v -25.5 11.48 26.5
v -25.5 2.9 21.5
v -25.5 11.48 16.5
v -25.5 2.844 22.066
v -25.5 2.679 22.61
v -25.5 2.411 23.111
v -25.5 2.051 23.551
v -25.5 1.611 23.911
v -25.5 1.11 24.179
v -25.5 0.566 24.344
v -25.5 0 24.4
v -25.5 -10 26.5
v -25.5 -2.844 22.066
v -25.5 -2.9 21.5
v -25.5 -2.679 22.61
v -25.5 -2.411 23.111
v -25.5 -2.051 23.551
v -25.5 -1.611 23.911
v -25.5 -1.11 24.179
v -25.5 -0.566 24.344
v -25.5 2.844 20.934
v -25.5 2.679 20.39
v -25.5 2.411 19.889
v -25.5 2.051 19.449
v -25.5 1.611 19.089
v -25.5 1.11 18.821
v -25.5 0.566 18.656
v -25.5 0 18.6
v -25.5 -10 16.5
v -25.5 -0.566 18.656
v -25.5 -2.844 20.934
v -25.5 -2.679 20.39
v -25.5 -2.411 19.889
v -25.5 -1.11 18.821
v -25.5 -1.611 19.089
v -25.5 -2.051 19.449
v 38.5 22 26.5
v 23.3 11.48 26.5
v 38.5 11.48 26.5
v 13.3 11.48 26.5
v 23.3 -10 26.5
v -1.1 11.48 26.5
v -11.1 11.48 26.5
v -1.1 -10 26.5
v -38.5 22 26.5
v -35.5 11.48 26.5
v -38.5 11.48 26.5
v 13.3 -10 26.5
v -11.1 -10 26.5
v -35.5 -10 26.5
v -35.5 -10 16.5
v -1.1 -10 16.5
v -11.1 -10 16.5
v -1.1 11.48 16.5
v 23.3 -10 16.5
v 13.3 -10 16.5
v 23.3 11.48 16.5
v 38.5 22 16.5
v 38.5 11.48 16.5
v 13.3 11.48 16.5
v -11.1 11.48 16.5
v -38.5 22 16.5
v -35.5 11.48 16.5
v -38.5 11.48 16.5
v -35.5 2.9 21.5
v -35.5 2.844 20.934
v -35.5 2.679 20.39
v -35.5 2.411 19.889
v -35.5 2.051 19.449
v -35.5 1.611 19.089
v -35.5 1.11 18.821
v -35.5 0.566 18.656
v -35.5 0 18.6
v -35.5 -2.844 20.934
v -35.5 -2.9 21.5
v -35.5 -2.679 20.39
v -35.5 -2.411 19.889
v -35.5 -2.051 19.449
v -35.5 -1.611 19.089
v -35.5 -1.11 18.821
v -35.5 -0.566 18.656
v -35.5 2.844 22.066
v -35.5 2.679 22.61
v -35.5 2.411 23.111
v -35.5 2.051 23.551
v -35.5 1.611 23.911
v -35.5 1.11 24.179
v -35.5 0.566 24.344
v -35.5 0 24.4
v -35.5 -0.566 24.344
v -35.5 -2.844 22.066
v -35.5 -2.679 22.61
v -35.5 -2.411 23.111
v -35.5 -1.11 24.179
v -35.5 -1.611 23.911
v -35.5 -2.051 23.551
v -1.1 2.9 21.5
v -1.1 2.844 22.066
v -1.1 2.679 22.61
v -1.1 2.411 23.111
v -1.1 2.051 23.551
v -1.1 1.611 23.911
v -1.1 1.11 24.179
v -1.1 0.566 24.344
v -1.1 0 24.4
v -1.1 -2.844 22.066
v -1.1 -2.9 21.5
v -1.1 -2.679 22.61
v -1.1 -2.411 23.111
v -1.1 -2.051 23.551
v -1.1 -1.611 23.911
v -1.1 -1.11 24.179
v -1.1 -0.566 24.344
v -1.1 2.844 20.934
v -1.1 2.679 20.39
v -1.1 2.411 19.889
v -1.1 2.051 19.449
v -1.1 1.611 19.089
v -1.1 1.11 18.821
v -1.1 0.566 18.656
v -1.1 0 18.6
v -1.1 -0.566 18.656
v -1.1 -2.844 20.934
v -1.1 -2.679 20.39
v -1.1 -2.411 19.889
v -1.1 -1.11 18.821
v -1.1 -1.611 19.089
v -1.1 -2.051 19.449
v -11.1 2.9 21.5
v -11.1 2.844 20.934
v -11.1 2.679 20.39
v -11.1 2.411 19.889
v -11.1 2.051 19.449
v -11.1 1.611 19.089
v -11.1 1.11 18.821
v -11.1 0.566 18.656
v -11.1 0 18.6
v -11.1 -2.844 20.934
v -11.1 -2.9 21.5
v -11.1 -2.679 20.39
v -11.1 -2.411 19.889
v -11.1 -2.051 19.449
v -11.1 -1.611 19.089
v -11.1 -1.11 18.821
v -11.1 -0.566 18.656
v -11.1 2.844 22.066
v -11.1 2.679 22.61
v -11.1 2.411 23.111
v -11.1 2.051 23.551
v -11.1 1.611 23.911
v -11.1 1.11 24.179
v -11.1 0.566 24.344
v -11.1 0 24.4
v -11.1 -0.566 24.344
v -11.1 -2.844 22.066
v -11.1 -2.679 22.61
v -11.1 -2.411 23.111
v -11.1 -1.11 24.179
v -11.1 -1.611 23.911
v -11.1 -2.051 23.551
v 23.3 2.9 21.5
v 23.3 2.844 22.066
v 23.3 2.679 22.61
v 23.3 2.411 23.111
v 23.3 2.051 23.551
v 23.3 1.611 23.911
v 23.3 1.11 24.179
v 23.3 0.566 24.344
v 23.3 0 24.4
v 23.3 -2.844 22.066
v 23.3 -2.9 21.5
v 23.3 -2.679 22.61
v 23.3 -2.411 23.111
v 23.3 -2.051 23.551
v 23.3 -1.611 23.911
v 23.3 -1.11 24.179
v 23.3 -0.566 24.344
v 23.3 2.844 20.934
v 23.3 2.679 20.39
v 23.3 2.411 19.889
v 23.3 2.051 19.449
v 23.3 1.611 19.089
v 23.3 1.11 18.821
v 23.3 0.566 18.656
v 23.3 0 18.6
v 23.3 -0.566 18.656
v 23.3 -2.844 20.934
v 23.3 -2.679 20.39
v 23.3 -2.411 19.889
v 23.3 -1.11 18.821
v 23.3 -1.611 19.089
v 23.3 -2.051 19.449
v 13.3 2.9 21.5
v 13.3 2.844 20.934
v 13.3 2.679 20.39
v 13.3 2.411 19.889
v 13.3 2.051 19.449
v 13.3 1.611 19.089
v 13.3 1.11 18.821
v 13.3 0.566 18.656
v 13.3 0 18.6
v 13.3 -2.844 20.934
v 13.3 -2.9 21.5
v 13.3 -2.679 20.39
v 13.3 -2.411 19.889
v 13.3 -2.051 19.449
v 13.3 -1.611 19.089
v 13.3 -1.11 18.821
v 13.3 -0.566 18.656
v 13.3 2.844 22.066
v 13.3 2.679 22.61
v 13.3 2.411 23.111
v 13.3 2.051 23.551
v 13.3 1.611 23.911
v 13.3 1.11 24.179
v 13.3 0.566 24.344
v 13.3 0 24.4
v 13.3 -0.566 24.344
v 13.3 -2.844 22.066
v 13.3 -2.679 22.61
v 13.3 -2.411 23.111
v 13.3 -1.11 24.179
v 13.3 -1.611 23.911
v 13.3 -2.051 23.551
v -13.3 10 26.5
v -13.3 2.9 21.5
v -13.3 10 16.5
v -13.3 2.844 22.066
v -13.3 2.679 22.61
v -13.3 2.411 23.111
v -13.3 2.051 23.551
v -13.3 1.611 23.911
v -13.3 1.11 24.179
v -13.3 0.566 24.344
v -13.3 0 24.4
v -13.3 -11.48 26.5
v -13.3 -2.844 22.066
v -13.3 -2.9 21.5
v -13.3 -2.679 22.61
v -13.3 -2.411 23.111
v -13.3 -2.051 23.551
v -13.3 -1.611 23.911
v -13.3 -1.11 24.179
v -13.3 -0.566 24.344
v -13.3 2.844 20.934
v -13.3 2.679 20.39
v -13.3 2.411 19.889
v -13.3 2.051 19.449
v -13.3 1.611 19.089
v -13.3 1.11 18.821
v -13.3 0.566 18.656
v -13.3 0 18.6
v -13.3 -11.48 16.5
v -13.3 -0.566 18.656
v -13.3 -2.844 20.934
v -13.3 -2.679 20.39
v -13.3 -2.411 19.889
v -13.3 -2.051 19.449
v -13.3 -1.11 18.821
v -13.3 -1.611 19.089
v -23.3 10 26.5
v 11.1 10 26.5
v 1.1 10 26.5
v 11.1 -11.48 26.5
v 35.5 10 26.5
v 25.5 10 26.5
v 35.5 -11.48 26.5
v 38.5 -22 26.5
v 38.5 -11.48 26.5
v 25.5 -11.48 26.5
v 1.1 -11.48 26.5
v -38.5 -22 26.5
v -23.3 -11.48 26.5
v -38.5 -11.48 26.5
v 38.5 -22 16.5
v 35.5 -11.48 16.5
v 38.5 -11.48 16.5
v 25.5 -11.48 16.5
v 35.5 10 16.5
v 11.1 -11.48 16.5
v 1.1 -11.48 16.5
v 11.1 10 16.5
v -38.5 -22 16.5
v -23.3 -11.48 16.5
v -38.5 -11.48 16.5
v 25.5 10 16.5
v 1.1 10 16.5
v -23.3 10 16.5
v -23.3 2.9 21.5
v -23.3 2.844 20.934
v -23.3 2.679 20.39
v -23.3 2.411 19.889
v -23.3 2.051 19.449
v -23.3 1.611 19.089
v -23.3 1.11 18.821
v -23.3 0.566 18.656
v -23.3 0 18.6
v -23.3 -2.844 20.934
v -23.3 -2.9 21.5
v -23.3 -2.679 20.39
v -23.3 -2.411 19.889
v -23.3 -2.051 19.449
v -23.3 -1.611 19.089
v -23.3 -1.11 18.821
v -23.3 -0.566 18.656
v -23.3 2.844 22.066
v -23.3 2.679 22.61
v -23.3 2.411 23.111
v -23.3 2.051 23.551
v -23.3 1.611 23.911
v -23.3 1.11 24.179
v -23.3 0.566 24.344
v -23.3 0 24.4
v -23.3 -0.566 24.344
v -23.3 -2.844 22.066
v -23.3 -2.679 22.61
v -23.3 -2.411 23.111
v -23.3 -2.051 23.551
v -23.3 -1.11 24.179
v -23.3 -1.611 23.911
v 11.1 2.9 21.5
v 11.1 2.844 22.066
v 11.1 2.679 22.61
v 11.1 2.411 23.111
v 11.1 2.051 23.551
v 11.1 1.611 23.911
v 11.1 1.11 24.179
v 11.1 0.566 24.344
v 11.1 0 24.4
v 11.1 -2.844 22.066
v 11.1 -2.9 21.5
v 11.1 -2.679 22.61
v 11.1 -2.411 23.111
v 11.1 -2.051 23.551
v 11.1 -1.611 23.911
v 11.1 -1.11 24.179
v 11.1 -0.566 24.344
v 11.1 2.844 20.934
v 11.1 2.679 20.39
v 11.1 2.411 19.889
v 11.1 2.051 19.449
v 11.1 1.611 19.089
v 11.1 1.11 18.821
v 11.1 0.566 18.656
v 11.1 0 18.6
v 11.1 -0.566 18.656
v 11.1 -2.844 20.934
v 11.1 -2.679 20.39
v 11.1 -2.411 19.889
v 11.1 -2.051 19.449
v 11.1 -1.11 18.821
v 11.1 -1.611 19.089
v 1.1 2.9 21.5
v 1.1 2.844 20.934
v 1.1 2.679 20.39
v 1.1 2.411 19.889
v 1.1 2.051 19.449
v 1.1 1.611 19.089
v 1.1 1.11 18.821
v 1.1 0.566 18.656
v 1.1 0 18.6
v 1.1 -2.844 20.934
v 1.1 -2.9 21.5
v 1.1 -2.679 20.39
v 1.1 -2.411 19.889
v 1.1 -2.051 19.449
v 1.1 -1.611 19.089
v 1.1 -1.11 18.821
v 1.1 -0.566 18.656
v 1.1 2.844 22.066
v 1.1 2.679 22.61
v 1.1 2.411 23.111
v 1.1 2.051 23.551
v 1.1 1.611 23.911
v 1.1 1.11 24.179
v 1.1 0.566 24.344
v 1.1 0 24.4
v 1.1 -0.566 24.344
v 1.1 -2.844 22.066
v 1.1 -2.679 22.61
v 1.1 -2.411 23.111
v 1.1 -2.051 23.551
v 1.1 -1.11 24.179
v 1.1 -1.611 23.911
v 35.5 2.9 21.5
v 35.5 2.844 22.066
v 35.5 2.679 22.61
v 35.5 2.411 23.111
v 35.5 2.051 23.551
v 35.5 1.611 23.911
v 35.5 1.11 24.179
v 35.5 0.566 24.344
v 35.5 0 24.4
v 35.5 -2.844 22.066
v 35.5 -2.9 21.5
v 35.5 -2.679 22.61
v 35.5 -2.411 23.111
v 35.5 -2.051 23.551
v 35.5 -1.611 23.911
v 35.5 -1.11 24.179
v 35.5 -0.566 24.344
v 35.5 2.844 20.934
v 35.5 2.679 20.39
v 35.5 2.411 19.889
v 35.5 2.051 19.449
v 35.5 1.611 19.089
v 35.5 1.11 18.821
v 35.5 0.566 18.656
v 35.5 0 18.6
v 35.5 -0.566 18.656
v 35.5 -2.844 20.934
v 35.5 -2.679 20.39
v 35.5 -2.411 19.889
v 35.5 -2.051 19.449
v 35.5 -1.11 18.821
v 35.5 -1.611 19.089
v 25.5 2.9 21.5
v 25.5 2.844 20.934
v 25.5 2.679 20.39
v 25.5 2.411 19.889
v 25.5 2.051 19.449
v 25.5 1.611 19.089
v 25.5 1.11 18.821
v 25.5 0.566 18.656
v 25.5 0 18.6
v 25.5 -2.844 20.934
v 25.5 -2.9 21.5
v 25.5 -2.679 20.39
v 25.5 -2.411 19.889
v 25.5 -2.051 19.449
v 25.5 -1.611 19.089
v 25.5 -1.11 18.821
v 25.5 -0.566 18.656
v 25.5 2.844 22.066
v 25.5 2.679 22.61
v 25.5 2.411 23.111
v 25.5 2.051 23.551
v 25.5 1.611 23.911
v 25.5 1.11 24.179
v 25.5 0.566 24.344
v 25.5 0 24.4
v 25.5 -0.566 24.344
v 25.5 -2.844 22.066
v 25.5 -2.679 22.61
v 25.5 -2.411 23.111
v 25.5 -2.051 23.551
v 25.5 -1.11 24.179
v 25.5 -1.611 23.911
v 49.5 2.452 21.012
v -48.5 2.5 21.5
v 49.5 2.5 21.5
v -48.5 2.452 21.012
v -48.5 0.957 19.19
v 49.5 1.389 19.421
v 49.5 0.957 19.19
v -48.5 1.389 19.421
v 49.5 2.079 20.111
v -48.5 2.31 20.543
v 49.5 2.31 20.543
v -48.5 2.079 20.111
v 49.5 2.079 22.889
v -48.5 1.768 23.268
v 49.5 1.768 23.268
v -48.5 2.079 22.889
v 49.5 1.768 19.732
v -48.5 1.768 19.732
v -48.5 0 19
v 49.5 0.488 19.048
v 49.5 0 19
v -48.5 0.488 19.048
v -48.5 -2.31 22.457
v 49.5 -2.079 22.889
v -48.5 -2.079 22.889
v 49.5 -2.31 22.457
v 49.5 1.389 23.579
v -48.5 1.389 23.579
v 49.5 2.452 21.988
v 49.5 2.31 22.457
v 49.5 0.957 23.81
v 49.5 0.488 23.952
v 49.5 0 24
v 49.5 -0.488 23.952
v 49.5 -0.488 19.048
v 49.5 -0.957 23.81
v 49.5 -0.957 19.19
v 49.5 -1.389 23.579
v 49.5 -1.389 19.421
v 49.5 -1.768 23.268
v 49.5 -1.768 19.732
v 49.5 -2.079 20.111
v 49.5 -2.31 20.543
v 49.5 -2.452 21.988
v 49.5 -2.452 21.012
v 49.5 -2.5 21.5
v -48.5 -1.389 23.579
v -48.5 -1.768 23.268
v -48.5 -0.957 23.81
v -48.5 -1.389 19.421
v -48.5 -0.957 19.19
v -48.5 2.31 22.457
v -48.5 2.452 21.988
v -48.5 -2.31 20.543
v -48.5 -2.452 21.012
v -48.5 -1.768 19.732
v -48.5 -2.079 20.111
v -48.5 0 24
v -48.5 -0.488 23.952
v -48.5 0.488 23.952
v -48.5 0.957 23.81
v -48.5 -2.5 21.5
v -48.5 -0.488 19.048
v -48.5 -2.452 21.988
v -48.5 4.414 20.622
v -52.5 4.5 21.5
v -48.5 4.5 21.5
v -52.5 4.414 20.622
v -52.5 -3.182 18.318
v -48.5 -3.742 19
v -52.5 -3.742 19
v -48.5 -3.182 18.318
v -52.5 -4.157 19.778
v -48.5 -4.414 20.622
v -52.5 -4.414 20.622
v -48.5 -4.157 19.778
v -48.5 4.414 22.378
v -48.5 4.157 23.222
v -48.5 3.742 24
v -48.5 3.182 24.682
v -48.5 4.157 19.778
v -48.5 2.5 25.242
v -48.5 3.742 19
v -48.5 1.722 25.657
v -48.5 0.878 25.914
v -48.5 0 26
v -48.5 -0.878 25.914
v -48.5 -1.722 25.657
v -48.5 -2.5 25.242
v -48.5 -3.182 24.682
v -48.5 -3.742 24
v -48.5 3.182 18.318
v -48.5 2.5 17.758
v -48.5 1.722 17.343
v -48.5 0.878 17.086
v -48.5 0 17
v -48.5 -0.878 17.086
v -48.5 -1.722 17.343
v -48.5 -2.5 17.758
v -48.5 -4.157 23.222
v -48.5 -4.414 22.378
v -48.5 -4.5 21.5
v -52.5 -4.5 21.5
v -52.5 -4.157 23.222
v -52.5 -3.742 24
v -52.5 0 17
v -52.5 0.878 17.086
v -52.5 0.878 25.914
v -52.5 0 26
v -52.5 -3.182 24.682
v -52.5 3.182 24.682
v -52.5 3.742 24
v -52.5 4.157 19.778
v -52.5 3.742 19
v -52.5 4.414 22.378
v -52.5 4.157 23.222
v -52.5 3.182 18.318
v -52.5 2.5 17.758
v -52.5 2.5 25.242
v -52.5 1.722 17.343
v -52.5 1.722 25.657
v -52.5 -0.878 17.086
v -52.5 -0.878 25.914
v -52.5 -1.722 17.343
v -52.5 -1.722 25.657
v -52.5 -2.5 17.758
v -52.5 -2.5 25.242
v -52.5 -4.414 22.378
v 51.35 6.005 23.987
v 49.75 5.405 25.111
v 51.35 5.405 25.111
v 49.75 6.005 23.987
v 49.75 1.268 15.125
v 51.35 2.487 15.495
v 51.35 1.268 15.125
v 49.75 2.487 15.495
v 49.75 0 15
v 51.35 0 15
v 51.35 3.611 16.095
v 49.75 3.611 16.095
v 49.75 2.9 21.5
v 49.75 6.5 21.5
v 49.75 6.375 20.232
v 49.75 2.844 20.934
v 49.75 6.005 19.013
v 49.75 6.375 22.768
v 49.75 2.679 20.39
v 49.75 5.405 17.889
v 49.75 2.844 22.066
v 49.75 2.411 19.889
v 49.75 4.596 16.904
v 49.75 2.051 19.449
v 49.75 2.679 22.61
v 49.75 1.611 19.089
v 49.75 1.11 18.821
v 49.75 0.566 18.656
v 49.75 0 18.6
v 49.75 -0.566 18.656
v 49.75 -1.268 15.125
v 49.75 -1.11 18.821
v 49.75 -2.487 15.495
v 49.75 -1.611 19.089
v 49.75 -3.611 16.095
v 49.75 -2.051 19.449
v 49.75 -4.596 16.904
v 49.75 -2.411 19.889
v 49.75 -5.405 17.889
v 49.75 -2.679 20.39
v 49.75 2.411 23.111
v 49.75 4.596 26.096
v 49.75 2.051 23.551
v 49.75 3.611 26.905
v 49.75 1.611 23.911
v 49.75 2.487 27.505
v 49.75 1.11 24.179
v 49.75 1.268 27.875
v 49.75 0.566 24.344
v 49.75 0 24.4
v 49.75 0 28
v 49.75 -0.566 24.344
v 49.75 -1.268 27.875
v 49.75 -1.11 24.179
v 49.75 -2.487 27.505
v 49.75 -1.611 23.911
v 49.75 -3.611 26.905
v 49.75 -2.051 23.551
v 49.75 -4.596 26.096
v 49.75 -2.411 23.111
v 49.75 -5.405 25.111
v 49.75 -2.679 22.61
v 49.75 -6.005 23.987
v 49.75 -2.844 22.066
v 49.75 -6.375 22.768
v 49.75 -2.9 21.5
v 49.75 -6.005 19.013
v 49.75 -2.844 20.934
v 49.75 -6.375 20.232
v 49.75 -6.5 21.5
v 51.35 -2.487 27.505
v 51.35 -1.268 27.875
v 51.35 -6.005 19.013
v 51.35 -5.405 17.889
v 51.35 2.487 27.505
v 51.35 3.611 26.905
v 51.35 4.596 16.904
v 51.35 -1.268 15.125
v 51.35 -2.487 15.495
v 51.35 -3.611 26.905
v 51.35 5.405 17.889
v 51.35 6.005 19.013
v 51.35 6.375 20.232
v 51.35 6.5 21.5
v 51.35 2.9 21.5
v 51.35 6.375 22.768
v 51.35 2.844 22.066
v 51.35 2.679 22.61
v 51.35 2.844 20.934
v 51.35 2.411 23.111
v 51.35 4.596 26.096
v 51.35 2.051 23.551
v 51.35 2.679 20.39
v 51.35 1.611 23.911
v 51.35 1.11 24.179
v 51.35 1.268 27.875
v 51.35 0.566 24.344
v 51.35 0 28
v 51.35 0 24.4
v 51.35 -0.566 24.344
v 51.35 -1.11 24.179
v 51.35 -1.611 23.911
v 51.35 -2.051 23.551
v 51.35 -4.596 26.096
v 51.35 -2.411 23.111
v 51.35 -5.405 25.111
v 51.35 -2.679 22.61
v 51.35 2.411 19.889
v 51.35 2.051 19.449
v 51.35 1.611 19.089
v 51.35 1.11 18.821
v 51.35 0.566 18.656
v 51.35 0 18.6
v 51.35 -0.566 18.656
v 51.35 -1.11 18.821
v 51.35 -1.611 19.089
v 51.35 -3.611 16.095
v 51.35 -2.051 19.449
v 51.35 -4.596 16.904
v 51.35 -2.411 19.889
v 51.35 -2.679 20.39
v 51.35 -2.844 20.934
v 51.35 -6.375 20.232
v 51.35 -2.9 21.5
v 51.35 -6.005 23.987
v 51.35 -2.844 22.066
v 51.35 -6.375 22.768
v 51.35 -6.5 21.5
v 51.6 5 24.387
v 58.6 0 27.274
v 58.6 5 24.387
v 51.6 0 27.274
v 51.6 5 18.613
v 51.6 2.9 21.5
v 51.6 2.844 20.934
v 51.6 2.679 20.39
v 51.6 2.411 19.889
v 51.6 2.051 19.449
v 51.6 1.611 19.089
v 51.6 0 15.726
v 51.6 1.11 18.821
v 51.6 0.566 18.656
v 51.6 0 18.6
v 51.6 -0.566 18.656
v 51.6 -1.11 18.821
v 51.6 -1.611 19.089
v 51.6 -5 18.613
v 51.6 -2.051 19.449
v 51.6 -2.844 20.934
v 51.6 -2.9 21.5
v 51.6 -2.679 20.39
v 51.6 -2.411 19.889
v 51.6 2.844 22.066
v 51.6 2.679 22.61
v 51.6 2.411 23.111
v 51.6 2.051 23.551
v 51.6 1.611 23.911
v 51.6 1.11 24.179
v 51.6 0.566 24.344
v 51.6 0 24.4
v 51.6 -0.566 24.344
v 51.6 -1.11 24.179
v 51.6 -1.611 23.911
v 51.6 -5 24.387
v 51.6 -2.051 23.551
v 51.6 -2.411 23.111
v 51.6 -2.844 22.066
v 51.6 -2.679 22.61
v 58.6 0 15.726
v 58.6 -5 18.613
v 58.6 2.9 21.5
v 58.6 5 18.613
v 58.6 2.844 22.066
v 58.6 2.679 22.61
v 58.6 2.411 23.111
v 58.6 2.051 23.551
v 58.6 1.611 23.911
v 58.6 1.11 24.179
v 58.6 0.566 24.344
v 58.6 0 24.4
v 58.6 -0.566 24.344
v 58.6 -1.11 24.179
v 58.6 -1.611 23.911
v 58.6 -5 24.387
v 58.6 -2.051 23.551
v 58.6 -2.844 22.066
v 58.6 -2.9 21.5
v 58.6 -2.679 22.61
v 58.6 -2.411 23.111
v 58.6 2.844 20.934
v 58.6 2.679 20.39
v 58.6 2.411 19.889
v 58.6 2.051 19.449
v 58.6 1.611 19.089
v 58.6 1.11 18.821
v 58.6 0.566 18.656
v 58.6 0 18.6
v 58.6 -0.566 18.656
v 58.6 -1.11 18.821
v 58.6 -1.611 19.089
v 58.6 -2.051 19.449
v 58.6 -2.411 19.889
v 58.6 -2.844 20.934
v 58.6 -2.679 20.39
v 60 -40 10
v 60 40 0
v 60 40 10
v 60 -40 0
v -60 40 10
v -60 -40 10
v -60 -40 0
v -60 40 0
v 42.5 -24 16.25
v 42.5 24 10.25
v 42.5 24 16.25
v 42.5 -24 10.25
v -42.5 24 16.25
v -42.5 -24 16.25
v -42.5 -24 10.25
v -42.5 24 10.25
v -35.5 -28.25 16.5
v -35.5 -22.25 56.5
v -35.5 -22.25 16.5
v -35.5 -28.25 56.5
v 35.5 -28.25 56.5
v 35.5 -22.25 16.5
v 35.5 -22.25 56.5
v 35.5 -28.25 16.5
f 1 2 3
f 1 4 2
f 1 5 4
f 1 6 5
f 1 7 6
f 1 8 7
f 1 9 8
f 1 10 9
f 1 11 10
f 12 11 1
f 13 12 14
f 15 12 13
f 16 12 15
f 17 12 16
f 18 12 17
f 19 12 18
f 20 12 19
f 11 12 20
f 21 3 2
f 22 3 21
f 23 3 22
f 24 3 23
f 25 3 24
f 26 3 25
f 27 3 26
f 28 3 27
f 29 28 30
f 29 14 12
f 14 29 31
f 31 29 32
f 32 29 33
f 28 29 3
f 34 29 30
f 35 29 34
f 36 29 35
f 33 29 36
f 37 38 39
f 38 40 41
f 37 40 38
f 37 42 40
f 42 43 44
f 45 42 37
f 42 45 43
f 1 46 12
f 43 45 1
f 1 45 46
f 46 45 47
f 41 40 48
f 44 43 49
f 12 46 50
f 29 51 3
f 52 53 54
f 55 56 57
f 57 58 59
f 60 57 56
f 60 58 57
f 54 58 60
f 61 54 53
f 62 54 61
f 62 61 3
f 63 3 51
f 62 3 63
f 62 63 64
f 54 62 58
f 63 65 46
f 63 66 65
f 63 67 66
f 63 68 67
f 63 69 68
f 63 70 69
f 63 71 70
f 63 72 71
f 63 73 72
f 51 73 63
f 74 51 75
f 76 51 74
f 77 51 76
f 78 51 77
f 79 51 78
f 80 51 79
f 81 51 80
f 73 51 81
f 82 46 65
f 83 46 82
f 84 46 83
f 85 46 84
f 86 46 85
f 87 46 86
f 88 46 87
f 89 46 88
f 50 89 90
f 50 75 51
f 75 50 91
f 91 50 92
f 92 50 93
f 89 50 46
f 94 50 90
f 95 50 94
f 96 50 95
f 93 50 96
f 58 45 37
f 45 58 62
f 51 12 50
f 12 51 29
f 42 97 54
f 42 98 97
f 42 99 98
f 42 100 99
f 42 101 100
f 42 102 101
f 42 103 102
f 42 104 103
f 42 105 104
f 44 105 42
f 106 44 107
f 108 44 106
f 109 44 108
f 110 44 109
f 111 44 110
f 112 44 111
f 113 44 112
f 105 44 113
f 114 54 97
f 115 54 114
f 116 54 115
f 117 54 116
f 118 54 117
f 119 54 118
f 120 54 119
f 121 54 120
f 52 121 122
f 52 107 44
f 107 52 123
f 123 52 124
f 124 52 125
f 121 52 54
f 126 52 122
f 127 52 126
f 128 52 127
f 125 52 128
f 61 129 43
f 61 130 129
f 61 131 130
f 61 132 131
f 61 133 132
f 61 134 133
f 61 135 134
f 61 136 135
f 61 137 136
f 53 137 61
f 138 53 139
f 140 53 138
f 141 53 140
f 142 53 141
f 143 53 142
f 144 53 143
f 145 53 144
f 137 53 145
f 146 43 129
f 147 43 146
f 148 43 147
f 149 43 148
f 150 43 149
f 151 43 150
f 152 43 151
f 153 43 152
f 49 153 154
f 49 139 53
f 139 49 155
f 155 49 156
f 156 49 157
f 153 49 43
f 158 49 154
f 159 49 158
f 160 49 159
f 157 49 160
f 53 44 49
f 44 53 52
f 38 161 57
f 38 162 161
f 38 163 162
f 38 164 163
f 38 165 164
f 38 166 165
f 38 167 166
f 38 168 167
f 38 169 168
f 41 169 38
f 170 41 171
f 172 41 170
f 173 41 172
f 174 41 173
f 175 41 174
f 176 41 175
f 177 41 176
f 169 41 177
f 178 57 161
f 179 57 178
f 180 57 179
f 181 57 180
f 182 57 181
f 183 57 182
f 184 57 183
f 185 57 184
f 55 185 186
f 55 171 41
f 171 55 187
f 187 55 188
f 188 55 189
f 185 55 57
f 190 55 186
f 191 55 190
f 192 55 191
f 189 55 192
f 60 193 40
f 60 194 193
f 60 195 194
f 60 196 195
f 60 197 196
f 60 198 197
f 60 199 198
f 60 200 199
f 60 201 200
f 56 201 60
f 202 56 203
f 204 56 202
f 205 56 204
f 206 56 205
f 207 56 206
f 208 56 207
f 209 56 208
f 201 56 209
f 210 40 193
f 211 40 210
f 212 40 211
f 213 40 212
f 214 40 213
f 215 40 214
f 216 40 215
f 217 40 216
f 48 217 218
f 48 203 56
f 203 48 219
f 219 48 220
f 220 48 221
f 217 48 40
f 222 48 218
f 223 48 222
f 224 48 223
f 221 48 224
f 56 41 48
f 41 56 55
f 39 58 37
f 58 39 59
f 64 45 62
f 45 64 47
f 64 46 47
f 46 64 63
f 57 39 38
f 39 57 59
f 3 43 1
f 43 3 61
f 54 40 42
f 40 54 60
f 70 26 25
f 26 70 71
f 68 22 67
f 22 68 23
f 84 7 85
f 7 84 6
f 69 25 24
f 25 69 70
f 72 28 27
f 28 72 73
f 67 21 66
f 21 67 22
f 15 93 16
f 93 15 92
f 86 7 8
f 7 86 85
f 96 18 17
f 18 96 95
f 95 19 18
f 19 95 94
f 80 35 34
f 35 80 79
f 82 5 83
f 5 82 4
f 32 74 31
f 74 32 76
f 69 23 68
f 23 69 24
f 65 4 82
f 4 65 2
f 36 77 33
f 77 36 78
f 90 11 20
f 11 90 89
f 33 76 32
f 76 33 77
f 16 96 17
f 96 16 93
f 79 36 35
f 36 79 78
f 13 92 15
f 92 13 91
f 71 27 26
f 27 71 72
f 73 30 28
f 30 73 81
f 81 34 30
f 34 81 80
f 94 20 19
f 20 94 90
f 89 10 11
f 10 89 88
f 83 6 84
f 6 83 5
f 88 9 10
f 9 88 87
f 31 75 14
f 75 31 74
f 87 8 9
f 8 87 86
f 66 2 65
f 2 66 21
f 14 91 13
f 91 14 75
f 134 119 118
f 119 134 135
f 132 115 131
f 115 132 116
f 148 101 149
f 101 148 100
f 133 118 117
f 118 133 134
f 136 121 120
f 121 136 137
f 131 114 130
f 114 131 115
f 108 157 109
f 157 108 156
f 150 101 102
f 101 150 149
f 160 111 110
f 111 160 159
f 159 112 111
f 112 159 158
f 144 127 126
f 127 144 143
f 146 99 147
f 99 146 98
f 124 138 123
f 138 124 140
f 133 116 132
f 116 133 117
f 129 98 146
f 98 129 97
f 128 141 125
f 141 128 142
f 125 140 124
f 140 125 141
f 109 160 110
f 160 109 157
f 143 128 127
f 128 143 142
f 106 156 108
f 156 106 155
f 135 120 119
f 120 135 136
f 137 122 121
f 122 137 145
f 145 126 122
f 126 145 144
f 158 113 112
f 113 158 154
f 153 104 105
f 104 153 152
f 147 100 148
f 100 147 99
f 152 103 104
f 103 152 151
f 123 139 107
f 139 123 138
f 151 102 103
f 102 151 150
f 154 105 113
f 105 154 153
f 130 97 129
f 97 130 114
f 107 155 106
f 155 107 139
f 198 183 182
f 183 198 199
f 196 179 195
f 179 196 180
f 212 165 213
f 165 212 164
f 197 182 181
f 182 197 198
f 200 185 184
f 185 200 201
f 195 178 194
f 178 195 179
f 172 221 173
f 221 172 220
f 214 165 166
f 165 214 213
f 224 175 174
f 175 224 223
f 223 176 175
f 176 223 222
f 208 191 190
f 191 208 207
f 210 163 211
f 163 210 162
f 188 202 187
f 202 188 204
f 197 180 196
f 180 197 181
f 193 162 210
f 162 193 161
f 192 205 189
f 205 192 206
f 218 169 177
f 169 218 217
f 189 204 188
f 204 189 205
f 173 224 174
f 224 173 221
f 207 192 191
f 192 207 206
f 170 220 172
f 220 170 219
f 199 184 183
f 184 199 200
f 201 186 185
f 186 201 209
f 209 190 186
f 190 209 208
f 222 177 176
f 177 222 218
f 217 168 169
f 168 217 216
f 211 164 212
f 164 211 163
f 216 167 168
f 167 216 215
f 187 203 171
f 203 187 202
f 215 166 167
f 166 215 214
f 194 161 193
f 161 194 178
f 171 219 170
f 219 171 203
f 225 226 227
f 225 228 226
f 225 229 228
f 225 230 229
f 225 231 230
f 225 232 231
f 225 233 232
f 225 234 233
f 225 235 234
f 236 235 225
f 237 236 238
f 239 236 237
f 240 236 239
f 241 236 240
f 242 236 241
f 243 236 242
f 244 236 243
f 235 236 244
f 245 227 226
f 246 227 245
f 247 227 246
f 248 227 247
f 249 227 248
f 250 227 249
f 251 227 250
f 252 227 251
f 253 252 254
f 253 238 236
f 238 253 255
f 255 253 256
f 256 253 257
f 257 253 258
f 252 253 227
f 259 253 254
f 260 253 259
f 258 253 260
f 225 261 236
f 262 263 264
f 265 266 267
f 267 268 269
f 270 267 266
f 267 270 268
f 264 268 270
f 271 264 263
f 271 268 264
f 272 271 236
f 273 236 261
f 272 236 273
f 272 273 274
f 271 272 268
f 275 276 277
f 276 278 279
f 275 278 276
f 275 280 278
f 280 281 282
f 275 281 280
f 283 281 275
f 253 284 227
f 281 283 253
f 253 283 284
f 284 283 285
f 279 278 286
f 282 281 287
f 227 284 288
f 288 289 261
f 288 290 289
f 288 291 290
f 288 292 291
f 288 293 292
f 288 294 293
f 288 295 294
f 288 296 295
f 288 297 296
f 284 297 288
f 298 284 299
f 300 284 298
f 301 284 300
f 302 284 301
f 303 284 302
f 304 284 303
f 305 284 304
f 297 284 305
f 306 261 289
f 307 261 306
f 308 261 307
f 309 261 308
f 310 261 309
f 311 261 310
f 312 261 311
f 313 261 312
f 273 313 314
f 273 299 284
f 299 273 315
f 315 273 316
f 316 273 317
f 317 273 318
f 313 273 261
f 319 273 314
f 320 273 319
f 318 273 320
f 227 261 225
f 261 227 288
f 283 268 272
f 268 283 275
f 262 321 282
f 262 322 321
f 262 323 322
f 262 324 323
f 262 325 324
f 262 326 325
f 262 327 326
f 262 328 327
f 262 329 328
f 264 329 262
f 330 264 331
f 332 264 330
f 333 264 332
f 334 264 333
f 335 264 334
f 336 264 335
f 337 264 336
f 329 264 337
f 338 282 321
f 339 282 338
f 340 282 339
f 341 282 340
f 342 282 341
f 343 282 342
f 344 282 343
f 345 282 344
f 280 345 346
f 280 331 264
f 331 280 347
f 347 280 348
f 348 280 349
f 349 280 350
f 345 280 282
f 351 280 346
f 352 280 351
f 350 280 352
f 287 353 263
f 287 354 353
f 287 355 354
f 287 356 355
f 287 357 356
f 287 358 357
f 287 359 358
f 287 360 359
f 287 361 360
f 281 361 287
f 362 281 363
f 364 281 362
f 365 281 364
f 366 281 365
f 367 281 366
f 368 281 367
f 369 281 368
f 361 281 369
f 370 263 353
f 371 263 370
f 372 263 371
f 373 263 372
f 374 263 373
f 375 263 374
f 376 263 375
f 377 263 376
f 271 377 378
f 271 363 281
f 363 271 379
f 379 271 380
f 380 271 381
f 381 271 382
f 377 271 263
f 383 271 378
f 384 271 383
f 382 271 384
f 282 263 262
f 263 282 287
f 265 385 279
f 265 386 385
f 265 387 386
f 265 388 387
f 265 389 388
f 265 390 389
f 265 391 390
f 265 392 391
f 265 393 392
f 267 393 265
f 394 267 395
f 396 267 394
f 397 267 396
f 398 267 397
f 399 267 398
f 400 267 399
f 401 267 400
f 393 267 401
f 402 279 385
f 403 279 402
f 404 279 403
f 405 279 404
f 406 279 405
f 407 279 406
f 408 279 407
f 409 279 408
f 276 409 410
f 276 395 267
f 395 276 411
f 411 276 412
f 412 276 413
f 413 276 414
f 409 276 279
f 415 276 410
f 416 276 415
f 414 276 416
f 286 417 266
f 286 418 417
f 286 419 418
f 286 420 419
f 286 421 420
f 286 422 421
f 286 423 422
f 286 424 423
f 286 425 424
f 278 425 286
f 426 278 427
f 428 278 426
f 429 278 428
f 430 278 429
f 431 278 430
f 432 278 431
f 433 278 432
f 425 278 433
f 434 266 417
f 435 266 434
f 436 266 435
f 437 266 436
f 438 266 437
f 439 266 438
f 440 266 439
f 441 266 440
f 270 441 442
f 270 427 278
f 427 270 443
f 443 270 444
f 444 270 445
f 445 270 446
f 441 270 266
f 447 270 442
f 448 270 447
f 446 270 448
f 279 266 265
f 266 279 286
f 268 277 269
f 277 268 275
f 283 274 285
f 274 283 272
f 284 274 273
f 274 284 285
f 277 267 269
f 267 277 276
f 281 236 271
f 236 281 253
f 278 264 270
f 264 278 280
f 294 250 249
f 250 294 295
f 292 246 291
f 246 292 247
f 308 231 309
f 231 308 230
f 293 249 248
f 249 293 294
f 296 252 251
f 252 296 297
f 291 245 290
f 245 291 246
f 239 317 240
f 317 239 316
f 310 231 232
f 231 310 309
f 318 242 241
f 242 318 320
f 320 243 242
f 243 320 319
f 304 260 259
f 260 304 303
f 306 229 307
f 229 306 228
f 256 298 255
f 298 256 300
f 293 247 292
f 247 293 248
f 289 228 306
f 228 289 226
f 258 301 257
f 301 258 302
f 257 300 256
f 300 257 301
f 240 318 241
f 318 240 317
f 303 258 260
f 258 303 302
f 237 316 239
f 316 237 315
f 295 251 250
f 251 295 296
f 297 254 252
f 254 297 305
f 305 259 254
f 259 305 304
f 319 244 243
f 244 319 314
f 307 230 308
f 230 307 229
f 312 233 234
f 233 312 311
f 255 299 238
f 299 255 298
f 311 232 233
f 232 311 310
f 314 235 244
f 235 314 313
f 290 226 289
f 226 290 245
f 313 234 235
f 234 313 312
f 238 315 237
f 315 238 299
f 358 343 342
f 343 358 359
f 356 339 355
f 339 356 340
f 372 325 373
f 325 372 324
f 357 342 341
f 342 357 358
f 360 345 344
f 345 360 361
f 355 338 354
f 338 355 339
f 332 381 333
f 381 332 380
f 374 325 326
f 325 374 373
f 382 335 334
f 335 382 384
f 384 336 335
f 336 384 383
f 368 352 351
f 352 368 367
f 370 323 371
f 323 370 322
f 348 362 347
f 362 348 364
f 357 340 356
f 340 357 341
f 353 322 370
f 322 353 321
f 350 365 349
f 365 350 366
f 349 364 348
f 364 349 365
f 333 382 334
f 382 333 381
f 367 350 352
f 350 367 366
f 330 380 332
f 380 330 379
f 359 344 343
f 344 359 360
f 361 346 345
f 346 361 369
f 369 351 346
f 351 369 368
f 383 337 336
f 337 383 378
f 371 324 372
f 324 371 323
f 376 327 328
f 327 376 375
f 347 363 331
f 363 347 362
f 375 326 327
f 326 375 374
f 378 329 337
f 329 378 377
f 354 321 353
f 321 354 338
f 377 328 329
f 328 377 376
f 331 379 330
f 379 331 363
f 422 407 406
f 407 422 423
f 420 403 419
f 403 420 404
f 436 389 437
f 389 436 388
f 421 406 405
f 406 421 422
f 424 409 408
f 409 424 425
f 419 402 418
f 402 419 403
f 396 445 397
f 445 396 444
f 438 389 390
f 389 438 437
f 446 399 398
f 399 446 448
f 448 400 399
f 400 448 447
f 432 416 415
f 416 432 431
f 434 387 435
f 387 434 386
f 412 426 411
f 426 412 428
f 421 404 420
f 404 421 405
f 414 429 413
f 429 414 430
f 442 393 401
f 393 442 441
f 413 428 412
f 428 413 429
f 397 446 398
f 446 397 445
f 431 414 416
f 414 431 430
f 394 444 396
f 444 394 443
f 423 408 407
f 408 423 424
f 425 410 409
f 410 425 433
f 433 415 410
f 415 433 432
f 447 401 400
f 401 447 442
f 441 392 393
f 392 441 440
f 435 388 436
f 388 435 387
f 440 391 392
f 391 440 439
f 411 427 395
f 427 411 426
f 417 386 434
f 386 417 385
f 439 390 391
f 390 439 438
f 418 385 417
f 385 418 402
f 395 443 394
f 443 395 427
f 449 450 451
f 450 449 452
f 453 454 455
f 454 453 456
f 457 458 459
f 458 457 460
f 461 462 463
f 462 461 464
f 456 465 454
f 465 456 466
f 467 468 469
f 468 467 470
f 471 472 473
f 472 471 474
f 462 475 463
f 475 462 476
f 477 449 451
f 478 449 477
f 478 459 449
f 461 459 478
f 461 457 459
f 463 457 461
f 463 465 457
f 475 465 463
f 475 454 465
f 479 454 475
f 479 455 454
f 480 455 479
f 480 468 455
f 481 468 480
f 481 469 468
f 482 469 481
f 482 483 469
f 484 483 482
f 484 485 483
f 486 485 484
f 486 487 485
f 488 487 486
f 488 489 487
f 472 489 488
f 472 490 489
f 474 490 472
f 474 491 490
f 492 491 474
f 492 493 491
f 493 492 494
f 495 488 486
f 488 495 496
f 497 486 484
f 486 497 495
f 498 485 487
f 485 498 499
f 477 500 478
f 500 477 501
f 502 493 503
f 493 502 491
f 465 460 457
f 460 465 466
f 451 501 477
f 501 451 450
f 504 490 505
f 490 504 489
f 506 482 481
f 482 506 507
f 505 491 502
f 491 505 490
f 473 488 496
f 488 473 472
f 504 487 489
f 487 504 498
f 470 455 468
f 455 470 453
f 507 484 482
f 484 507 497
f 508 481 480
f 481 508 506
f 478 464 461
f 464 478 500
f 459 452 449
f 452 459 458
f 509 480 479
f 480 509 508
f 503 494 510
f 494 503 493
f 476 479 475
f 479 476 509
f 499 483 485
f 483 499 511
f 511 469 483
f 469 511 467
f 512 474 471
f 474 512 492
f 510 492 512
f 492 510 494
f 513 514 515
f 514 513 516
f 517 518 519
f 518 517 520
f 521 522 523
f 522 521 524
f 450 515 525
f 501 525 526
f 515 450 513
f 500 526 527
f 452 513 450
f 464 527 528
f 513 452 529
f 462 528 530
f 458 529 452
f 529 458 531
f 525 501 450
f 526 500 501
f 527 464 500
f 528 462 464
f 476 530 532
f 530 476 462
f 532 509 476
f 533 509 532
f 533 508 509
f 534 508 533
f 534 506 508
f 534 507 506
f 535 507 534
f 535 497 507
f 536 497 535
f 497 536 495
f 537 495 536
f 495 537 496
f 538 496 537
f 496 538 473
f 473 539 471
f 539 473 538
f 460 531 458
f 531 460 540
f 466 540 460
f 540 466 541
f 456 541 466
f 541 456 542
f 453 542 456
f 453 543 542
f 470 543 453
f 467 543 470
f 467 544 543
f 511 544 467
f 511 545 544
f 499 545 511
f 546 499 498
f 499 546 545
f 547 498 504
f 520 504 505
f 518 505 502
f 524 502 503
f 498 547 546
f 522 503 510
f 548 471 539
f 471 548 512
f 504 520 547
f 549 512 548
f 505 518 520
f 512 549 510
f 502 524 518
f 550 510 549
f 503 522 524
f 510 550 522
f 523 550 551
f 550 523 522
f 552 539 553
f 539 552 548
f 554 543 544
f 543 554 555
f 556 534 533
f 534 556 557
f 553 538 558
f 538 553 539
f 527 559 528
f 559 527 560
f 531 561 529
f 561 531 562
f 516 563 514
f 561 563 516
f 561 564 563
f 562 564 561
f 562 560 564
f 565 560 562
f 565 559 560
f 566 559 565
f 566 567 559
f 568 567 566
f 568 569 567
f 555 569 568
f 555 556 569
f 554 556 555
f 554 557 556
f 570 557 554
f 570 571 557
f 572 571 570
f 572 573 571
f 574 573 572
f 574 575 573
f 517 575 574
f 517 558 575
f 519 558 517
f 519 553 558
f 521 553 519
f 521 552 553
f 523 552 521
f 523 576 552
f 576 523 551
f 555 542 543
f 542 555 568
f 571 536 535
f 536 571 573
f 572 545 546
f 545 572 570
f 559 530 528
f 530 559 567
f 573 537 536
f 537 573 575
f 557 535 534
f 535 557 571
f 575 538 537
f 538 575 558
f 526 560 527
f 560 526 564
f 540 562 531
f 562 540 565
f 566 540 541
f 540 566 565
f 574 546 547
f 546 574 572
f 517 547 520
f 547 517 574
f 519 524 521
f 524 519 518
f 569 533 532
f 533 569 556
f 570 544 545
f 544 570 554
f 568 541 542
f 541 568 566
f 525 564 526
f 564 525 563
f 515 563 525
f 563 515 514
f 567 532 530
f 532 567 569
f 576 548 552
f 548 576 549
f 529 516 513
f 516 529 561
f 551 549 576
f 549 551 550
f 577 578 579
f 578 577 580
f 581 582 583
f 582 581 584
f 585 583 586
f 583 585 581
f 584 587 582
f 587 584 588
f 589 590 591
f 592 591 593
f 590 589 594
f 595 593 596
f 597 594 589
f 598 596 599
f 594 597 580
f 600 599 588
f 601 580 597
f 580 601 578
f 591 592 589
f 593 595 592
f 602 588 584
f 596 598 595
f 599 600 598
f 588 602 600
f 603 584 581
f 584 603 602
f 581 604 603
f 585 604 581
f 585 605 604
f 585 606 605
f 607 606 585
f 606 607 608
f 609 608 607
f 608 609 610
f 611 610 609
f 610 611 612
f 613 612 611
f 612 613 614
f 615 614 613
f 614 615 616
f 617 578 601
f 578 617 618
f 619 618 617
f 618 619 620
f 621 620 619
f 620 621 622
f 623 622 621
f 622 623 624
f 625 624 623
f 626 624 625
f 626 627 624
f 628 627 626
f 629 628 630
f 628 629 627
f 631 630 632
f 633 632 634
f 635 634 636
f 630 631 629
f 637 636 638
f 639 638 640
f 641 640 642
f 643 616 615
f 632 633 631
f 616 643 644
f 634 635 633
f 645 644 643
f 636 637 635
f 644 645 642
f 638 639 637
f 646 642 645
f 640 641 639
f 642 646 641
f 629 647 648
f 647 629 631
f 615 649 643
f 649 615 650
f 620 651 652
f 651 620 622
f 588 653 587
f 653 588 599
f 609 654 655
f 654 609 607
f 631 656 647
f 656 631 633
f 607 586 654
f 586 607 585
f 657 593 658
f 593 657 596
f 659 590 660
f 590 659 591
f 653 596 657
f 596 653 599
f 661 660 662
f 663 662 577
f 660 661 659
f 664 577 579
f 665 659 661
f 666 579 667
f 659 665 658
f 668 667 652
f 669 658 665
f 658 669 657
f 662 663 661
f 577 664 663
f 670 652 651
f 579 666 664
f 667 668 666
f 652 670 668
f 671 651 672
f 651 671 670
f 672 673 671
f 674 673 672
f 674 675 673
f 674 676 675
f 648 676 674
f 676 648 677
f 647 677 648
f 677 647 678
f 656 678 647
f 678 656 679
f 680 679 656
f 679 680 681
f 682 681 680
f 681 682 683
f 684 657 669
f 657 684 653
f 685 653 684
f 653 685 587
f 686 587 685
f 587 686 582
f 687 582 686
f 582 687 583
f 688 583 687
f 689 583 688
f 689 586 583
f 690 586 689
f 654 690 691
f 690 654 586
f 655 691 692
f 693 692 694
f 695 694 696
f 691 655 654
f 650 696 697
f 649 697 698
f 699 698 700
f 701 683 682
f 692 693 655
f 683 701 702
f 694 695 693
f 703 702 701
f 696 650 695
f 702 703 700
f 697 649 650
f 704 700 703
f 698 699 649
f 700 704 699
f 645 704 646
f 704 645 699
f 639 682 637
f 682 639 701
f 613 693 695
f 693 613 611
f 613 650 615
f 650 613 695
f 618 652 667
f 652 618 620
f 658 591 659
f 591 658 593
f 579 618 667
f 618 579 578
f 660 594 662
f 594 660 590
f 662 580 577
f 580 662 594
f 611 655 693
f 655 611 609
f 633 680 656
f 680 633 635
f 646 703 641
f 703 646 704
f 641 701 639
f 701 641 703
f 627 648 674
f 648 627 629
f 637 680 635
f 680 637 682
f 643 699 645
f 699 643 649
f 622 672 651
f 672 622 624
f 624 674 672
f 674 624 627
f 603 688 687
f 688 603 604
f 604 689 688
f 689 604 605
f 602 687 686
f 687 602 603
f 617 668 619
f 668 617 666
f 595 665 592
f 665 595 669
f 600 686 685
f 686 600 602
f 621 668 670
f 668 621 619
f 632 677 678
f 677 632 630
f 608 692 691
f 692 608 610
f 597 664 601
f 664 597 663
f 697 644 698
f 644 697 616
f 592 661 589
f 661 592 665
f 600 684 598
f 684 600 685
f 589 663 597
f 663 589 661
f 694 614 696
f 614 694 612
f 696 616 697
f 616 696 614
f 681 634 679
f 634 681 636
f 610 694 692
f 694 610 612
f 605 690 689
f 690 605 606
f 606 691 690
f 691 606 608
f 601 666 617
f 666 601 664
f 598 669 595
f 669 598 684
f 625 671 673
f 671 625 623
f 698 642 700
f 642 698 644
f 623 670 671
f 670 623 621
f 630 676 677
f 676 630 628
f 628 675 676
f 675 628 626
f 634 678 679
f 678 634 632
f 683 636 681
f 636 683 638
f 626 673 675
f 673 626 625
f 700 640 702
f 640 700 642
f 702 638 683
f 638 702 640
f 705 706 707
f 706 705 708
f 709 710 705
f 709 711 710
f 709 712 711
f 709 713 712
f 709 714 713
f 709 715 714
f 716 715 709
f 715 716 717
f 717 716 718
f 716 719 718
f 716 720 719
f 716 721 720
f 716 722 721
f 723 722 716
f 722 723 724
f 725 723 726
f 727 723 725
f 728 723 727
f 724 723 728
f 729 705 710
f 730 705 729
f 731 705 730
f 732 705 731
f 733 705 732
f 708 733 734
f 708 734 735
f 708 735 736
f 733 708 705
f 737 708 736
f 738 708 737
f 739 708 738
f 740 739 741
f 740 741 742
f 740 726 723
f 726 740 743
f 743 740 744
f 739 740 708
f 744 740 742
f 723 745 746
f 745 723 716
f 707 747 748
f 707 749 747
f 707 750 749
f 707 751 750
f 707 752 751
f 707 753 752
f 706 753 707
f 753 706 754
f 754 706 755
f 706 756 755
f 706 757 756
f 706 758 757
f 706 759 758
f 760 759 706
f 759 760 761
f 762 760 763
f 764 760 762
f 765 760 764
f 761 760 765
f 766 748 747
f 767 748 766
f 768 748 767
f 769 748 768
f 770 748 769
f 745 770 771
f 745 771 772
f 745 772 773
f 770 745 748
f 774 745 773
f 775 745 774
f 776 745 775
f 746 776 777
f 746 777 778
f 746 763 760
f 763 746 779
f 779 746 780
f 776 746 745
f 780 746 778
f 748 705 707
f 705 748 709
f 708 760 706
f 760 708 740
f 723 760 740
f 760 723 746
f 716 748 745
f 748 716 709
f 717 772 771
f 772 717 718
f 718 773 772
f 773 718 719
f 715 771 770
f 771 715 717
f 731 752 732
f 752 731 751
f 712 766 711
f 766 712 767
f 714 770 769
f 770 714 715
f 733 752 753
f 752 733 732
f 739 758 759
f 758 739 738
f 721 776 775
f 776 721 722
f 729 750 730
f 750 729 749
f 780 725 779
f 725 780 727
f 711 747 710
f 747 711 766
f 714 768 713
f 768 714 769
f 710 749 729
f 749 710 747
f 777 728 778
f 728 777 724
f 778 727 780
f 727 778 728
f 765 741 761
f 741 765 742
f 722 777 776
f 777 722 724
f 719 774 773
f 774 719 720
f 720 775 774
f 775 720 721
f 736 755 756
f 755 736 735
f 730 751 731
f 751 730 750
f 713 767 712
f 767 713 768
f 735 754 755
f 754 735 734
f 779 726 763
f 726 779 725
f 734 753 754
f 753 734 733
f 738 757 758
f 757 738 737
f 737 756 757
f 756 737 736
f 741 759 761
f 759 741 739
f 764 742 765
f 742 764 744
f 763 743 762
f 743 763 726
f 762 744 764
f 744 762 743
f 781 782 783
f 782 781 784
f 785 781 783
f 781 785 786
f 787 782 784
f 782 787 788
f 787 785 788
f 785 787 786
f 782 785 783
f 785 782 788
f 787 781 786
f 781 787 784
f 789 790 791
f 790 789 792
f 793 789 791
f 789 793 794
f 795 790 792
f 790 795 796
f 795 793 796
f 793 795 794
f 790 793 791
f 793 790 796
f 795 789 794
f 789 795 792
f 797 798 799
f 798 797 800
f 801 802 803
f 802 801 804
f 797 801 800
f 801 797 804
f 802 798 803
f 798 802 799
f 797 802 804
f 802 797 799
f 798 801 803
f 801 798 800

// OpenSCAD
$fn = 32;

// ------------------------------------------------------------------------
// Comb hinge with flap: leaf 77 x 22 mm, pin d5, flap 40 mm
// Every part is its own module, assembly() places every instance.
// ------------------------------------------------------------------------

// --- part 1 ---
module hinge_bed() {
  difference() {
    translate([-60, -40, 0]) cube([120, 80, 10]);
  }
}

// --- part 2 ---
module hinge_riser() {
  difference() {
    translate([-42.5, -24, 0]) cube([85, 48, 6]);
  }
}

// --- part 3 ---
module hinge_leaf_a() {
  difference() {
    union() {
      translate([-35.5, -10, -5]) cube([10, 32, 10]);
      translate([-11.1, -10, -5]) cube([10, 32, 10]);
      translate([13.3, -10, -5]) cube([10, 32, 10]);
      translate([-38.5, 11.48, -5]) cube([77, 10.52, 10]);
    }
    translate([-30.5, 0, 0]) rotate([0, 90, 0]) cylinder(h = 12, d = 5.8, center = true);
    translate([-6.1, 0, 0]) rotate([0, 90, 0]) cylinder(h = 12, d = 5.8, center = true);
    translate([18.3, 0, 0]) rotate([0, 90, 0]) cylinder(h = 12, d = 5.8, center = true);
  }
}

// --- part 4 ---
module hinge_leaf_b() {
  difference() {
    union() {
      translate([-23.3, -22, -5]) cube([10, 32, 10]);
      translate([1.1, -22, -5]) cube([10, 32, 10]);
      translate([25.5, -22, -5]) cube([10, 32, 10]);
      translate([-38.5, -22, -5]) cube([77, 10.52, 10]);
    }
    translate([-18.3, 0, 0]) rotate([0, 90, 0]) cylinder(h = 12, d = 5.8, center = true);
    translate([6.1, 0, 0]) rotate([0, 90, 0]) cylinder(h = 12, d = 5.8, center = true);
    translate([30.5, 0, 0]) rotate([0, 90, 0]) cylinder(h = 12, d = 5.8, center = true);
  }
}

// --- part 5 ---
module hinge_flap() {
  difference() {
    translate([-35.5, -20, 0]) cube([71, 40, 6]);
  }
}

// --- part 6 ---
module hinge_pin() {
  rotate([0, 90, 0]) cylinder(h = 99, d = 5, center = true);
  translate([-52.5, 0, 0]) rotate([0, 90, 0]) cylinder(h = 4, d = 9);
}

// --- part 7 ---
module pin_washer() {
  difference() {
      translate([0, 0, 0]) cylinder(h = 1.6, d = 13);
      translate([0, 0, -1]) cylinder(h = 3.6, d = 5.8);
    }
}

// --- part 8 ---
module pin_nut() {
  difference() {
    linear_extrude(height = 7) polygon(points = [[5.774, 0], [2.887, 5], [-2.887, 5], [-5.774, 0], [-2.887, -5], [2.887, -5]]);
    translate([0, 0, -1]) cylinder(h = 9, d = 5.8);
  }
}

// --- assembly ---
module assembly() {
  color([0.80, 0.24, 0.20]) translate([0, 0, 0]) rotate([0, 0, 0]) hinge_bed();
  color([0.20, 0.45, 0.75]) translate([0, 0, 10.25]) rotate([0, 0, 0]) hinge_riser();
  color([0.25, 0.62, 0.32]) translate([0, 0, 21.5]) rotate([0, 0, 0]) hinge_leaf_a();
  color([0.92, 0.70, 0.18]) translate([0, 0, 21.5]) rotate([0, 0, 0]) hinge_leaf_b();
  color([0.58, 0.35, 0.70]) translate([0, -22.25, 36.5]) rotate([90, 0, 0]) hinge_flap();
  color([0.16, 0.66, 0.66]) translate([0, 0, 21.5]) rotate([0, 0, 0]) hinge_pin();
  color([0.85, 0.48, 0.18]) translate([49.75, 0, 21.5]) rotate([0, 90, 0]) pin_washer();
  color([0.55, 0.60, 0.65]) translate([51.6, 0, 21.5]) rotate([0, 90, 0]) pin_nut();
}

assembly();
